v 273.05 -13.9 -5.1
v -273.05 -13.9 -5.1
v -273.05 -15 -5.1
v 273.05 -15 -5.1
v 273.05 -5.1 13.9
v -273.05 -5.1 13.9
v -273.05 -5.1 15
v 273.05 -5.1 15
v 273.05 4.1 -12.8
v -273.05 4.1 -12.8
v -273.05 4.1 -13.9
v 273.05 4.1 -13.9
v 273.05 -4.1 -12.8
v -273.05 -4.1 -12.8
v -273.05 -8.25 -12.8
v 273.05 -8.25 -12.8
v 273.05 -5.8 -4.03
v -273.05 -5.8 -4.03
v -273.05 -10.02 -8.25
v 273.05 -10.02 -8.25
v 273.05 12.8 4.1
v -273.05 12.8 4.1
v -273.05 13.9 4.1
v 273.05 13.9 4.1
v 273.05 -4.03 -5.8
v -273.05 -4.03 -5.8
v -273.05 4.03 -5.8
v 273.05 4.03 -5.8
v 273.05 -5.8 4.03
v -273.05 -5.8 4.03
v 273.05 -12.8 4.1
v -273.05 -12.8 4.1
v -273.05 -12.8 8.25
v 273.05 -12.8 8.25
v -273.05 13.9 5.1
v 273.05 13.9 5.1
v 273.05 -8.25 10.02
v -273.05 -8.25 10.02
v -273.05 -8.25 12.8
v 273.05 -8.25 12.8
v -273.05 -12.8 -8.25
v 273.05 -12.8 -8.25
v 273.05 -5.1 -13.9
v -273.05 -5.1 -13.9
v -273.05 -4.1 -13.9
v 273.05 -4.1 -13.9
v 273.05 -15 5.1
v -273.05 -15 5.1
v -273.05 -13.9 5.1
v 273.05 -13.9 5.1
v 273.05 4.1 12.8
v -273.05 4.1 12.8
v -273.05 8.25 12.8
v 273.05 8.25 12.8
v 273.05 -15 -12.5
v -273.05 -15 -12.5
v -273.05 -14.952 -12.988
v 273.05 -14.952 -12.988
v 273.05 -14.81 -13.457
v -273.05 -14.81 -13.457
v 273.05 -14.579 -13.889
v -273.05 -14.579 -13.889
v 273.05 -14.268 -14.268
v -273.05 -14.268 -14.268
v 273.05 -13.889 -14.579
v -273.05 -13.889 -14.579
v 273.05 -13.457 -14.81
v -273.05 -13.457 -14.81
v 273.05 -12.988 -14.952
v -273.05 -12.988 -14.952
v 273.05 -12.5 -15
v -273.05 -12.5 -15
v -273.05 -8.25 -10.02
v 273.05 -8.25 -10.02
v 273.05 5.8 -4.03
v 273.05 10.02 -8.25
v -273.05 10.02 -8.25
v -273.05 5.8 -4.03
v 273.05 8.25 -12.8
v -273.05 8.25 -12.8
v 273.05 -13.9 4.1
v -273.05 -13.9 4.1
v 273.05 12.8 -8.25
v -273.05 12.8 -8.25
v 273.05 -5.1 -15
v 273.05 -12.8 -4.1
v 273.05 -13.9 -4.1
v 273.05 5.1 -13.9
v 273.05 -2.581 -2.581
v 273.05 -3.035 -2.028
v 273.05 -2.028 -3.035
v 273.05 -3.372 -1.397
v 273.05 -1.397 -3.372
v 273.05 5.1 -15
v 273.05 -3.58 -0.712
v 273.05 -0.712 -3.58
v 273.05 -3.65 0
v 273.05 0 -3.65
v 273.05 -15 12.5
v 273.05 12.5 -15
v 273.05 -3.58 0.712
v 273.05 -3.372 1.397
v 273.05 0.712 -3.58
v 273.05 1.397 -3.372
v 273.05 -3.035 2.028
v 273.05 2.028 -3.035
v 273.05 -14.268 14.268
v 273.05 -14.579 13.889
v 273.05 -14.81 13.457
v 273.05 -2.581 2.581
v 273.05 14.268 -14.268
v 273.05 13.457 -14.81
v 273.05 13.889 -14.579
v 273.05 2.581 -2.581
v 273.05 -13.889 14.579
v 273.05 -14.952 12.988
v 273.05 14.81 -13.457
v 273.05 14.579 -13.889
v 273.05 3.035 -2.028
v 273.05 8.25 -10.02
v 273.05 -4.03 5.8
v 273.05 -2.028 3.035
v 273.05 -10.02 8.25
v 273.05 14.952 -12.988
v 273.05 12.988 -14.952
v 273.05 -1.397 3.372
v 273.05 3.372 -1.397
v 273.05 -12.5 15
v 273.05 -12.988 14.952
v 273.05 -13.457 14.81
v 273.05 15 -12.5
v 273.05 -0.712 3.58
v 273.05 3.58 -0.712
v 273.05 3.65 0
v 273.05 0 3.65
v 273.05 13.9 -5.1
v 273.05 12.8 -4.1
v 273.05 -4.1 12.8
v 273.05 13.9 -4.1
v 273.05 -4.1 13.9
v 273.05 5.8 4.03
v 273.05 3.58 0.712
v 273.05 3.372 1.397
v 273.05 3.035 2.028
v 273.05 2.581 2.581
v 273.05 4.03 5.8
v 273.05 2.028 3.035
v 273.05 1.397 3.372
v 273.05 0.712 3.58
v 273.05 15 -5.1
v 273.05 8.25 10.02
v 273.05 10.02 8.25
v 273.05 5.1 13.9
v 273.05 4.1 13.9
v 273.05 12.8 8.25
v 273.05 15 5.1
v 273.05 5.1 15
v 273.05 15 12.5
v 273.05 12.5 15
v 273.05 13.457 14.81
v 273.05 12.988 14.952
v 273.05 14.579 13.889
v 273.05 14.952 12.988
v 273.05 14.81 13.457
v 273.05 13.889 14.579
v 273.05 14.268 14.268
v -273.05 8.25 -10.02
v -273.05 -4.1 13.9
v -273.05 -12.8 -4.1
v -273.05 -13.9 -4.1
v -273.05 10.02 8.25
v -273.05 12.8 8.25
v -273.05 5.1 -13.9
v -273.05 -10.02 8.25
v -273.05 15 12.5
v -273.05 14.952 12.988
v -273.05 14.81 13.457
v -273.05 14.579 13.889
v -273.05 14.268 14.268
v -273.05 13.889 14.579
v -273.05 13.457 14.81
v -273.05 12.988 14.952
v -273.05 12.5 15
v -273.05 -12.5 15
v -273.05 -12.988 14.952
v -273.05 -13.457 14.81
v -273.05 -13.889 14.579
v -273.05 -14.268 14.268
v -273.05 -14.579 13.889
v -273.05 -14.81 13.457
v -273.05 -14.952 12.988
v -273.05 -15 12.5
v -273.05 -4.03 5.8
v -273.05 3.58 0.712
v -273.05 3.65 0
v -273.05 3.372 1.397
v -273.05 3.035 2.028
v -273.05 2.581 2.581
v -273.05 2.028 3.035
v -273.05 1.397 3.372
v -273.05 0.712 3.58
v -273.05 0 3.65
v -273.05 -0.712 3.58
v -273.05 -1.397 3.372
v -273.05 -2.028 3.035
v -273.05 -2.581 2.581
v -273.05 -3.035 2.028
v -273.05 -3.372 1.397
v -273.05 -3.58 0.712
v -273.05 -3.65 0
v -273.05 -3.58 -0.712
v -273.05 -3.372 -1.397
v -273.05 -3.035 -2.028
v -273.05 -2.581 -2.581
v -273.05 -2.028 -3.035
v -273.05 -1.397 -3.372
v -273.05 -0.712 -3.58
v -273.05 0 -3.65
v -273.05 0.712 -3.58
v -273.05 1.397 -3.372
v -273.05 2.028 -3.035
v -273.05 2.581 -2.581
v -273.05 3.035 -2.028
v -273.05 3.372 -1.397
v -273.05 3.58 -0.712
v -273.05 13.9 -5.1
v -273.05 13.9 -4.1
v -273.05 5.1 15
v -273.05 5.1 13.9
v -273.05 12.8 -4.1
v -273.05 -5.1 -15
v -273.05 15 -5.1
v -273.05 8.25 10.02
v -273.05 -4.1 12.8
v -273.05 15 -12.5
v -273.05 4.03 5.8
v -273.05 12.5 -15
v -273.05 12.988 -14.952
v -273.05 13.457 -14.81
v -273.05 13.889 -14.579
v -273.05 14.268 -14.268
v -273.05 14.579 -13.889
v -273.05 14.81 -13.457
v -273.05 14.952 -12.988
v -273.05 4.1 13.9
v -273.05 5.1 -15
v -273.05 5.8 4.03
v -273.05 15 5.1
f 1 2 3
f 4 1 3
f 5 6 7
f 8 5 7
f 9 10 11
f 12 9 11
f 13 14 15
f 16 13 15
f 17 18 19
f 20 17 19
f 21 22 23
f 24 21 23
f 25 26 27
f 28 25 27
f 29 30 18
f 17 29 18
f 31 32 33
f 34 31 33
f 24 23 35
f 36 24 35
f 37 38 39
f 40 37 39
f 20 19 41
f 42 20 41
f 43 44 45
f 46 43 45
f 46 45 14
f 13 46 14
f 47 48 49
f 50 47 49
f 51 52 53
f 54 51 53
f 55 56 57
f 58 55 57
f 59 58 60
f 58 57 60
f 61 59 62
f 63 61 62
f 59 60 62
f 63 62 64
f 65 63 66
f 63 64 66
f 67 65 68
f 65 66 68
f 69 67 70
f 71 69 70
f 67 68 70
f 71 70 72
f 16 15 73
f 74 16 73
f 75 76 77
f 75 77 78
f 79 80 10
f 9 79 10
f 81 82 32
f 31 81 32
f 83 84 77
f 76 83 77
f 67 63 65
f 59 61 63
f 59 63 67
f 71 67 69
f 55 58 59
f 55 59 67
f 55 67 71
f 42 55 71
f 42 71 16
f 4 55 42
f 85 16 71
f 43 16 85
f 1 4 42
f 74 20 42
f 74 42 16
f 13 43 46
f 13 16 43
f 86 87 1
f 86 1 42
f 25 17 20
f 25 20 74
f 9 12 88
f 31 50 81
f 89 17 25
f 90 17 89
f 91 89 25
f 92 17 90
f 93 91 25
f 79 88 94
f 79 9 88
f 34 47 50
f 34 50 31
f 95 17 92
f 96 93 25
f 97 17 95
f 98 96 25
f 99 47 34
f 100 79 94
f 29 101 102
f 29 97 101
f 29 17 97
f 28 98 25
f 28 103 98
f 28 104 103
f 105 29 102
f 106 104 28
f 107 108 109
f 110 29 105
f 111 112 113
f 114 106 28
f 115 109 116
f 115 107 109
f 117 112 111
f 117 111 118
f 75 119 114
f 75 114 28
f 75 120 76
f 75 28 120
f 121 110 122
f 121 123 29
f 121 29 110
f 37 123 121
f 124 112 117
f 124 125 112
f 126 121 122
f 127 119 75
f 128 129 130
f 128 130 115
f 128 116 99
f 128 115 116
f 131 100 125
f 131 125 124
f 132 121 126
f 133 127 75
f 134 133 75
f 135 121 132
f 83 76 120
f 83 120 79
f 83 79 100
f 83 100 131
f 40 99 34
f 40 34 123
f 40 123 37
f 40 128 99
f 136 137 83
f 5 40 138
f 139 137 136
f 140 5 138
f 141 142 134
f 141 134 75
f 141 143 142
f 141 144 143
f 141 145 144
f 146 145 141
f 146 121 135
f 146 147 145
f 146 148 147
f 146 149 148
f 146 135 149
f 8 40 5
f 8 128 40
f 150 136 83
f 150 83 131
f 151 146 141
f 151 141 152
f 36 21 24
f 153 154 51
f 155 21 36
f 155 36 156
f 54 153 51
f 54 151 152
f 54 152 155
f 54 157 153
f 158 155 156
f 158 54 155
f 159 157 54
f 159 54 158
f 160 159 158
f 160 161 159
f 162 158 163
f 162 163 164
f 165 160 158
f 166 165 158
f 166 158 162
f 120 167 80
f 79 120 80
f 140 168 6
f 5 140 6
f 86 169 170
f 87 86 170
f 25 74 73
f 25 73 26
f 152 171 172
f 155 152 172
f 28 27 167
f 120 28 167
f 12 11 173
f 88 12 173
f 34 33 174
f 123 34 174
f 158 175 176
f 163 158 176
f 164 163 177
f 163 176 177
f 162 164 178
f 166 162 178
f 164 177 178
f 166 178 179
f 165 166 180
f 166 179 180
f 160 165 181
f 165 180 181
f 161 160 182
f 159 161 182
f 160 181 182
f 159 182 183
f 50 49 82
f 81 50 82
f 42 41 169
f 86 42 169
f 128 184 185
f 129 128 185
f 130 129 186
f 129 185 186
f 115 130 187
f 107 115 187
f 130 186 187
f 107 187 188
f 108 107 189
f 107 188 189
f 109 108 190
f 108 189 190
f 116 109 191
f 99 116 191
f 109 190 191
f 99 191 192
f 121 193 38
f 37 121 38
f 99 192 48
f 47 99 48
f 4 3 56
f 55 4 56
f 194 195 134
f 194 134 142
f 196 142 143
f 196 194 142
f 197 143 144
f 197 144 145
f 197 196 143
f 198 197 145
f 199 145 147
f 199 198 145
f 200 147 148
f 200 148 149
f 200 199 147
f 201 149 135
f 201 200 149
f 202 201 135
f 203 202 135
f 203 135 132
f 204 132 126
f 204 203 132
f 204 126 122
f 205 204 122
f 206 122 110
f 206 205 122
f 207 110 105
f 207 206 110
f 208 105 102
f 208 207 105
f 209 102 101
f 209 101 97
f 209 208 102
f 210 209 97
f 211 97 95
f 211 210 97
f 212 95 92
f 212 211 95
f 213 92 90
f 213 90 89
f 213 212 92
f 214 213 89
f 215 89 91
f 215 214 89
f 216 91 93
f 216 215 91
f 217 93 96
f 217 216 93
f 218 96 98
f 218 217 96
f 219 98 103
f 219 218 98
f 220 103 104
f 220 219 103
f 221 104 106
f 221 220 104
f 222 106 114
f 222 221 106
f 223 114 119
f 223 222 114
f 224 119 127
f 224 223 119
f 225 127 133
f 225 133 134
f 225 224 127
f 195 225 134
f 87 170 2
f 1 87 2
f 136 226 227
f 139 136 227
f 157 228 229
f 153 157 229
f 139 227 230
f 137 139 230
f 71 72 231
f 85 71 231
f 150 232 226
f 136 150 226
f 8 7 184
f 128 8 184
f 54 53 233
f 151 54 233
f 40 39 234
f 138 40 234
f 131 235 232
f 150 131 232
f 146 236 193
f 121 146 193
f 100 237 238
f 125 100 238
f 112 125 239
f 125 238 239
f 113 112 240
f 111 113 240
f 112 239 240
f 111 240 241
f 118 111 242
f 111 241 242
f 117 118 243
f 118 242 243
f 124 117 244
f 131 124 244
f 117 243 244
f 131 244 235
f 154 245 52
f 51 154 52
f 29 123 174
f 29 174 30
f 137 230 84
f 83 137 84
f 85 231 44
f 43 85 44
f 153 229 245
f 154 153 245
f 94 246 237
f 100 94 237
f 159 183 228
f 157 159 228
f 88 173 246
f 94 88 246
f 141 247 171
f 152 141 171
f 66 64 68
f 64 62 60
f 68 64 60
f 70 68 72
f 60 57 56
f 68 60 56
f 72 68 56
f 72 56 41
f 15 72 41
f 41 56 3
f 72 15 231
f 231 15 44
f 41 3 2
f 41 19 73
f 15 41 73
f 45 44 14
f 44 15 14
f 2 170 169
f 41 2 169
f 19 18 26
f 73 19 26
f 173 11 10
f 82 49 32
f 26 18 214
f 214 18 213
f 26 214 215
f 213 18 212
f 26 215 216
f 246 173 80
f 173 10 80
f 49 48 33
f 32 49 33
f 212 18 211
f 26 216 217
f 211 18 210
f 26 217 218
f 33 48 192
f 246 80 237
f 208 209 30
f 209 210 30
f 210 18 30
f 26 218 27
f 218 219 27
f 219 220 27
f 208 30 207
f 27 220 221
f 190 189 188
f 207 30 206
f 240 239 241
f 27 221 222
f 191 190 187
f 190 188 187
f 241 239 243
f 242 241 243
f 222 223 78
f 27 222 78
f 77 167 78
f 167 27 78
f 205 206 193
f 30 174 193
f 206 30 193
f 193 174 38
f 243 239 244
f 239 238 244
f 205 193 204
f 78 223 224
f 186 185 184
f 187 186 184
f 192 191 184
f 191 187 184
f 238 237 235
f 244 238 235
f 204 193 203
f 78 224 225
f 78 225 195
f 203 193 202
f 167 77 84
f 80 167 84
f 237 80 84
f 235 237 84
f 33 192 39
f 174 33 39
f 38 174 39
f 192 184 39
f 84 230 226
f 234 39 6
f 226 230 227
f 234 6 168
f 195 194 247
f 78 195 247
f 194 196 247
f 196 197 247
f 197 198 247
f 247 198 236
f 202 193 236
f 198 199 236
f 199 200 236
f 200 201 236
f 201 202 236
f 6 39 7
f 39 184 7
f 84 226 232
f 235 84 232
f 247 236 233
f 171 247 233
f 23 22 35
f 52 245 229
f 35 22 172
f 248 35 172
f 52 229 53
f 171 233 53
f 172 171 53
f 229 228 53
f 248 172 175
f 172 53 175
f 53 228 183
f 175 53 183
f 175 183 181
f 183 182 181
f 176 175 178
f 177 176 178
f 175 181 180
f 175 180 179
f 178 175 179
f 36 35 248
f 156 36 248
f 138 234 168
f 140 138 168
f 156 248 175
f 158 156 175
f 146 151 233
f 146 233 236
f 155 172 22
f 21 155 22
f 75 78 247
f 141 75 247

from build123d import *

# Parameters (mm, degrees)
SKETCH11_R                          = 3.65
BOSCHREXROTH_BOSCH_30X30_V2_1_DEPTH = 546.1


with BuildPart() as part:
    # Sketch11 → Boschrexroth BOSCH_30X30_V2(1) (new body)
    with BuildSketch(Plane.YZ.offset(-273.05)):
        with BuildLine():
            Line((0, 5.8), (-4.03, 5.8))
            Line((-4.03, 5.8), (-8.25, 10.02))
            Line((-8.25, 10.02), (-8.25, 12.8))
            Line((-8.25, 12.8), (-4.1, 12.8))
            Line((-4.1, 12.8), (-4.1, 13.9))
            Line((-4.1, 13.9), (-5.1, 13.9))
            Line((-5.1, 13.9), (-5.1, 15))
            Line((-5.1, 15), (-12.5, 15))
            ThreePointArc((-12.5, 15), (-14.267766953, 14.267766953), (-15, 12.5))
            Line((-15, 12.5), (-15, 5.1))
            Line((-15, 5.1), (-13.9, 5.1))
            Line((-13.9, 5.1), (-13.9, 4.1))
            Line((-13.9, 4.1), (-12.8, 4.1))
            Line((-12.8, 4.1), (-12.8, 8.25))
            Line((-12.8, 8.25), (-10.02, 8.25))
            Line((-10.02, 8.25), (-5.8, 4.03))
            Line((-5.8, 4.03), (-5.8, 0))
            Line((-5.8, 0), (-5.8, -4.03))
            Line((-5.8, -4.03), (-10.02, -8.25))
            Line((-10.02, -8.25), (-12.8, -8.25))
            Line((-12.8, -8.25), (-12.8, -4.1))
            Line((-12.8, -4.1), (-13.9, -4.1))
            Line((-13.9, -4.1), (-13.9, -5.1))
            Line((-13.9, -5.1), (-15, -5.1))
            Line((-15, -5.1), (-15, -12.5))
            ThreePointArc((-15, -12.5), (-14.267766953, -14.267766953), (-12.5, -15))
            Line((-12.5, -15), (-5.1, -15))
            Line((-5.1, -15), (-5.1, -13.9))
            Line((-5.1, -13.9), (-4.1, -13.9))
            Line((-4.1, -13.9), (-4.1, -12.8))
            Line((-4.1, -12.8), (-8.25, -12.8))
            Line((-8.25, -12.8), (-8.25, -10.02))
            Line((-8.25, -10.02), (-4.03, -5.8))
            Line((-4.03, -5.8), (4.03, -5.8))
            Line((4.03, -5.8), (8.25, -10.02))
            Line((8.25, -10.02), (8.25, -12.8))
            Line((8.25, -12.8), (4.1, -12.8))
            Line((4.1, -12.8), (4.1, -13.9))
            Line((4.1, -13.9), (5.1, -13.9))
            Line((5.1, -13.9), (5.1, -15))
            Line((5.1, -15), (12.5, -15))
            ThreePointArc((12.5, -15), (14.267766953, -14.267766953), (15, -12.5))
            Line((15, -12.5), (15, -5.1))
            Line((15, -5.1), (13.9, -5.1))
            Line((13.9, -5.1), (13.9, -4.1))
            Line((13.9, -4.1), (12.8, -4.1))
            Line((12.8, -4.1), (12.8, -8.25))
            Line((12.8, -8.25), (10.02, -8.25))
            Line((10.02, -8.25), (5.8, -4.03))
            Line((5.8, -4.03), (5.8, 0))
            Line((5.8, 0), (5.8, 4.03))
            Line((5.8, 4.03), (10.02, 8.25))
            Line((10.02, 8.25), (12.8, 8.25))
            Line((12.8, 8.25), (12.8, 4.1))
            Line((12.8, 4.1), (13.9, 4.1))
            Line((13.9, 4.1), (13.9, 5.1))
            Line((13.9, 5.1), (15, 5.1))
            Line((15, 5.1), (15, 12.5))
            ThreePointArc((15, 12.5), (14.267766953, 14.267766953), (12.5, 15))
            Line((12.5, 15), (5.1, 15))
            Line((5.1, 15), (5.1, 13.9))
            Line((5.1, 13.9), (4.1, 13.9))
            Line((4.1, 13.9), (4.1, 12.8))
            Line((4.1, 12.8), (8.25, 12.8))
            Line((8.25, 12.8), (8.25, 10.02))
            Line((8.25, 10.02), (4.03, 5.8))
            Line((4.03, 5.8), (0, 5.8))
        make_face()
        Circle(SKETCH11_R, mode=Mode.SUBTRACT)
    extrude(amount=BOSCHREXROTH_BOSCH_30X30_V2_1_DEPTH)


solid = part.part
